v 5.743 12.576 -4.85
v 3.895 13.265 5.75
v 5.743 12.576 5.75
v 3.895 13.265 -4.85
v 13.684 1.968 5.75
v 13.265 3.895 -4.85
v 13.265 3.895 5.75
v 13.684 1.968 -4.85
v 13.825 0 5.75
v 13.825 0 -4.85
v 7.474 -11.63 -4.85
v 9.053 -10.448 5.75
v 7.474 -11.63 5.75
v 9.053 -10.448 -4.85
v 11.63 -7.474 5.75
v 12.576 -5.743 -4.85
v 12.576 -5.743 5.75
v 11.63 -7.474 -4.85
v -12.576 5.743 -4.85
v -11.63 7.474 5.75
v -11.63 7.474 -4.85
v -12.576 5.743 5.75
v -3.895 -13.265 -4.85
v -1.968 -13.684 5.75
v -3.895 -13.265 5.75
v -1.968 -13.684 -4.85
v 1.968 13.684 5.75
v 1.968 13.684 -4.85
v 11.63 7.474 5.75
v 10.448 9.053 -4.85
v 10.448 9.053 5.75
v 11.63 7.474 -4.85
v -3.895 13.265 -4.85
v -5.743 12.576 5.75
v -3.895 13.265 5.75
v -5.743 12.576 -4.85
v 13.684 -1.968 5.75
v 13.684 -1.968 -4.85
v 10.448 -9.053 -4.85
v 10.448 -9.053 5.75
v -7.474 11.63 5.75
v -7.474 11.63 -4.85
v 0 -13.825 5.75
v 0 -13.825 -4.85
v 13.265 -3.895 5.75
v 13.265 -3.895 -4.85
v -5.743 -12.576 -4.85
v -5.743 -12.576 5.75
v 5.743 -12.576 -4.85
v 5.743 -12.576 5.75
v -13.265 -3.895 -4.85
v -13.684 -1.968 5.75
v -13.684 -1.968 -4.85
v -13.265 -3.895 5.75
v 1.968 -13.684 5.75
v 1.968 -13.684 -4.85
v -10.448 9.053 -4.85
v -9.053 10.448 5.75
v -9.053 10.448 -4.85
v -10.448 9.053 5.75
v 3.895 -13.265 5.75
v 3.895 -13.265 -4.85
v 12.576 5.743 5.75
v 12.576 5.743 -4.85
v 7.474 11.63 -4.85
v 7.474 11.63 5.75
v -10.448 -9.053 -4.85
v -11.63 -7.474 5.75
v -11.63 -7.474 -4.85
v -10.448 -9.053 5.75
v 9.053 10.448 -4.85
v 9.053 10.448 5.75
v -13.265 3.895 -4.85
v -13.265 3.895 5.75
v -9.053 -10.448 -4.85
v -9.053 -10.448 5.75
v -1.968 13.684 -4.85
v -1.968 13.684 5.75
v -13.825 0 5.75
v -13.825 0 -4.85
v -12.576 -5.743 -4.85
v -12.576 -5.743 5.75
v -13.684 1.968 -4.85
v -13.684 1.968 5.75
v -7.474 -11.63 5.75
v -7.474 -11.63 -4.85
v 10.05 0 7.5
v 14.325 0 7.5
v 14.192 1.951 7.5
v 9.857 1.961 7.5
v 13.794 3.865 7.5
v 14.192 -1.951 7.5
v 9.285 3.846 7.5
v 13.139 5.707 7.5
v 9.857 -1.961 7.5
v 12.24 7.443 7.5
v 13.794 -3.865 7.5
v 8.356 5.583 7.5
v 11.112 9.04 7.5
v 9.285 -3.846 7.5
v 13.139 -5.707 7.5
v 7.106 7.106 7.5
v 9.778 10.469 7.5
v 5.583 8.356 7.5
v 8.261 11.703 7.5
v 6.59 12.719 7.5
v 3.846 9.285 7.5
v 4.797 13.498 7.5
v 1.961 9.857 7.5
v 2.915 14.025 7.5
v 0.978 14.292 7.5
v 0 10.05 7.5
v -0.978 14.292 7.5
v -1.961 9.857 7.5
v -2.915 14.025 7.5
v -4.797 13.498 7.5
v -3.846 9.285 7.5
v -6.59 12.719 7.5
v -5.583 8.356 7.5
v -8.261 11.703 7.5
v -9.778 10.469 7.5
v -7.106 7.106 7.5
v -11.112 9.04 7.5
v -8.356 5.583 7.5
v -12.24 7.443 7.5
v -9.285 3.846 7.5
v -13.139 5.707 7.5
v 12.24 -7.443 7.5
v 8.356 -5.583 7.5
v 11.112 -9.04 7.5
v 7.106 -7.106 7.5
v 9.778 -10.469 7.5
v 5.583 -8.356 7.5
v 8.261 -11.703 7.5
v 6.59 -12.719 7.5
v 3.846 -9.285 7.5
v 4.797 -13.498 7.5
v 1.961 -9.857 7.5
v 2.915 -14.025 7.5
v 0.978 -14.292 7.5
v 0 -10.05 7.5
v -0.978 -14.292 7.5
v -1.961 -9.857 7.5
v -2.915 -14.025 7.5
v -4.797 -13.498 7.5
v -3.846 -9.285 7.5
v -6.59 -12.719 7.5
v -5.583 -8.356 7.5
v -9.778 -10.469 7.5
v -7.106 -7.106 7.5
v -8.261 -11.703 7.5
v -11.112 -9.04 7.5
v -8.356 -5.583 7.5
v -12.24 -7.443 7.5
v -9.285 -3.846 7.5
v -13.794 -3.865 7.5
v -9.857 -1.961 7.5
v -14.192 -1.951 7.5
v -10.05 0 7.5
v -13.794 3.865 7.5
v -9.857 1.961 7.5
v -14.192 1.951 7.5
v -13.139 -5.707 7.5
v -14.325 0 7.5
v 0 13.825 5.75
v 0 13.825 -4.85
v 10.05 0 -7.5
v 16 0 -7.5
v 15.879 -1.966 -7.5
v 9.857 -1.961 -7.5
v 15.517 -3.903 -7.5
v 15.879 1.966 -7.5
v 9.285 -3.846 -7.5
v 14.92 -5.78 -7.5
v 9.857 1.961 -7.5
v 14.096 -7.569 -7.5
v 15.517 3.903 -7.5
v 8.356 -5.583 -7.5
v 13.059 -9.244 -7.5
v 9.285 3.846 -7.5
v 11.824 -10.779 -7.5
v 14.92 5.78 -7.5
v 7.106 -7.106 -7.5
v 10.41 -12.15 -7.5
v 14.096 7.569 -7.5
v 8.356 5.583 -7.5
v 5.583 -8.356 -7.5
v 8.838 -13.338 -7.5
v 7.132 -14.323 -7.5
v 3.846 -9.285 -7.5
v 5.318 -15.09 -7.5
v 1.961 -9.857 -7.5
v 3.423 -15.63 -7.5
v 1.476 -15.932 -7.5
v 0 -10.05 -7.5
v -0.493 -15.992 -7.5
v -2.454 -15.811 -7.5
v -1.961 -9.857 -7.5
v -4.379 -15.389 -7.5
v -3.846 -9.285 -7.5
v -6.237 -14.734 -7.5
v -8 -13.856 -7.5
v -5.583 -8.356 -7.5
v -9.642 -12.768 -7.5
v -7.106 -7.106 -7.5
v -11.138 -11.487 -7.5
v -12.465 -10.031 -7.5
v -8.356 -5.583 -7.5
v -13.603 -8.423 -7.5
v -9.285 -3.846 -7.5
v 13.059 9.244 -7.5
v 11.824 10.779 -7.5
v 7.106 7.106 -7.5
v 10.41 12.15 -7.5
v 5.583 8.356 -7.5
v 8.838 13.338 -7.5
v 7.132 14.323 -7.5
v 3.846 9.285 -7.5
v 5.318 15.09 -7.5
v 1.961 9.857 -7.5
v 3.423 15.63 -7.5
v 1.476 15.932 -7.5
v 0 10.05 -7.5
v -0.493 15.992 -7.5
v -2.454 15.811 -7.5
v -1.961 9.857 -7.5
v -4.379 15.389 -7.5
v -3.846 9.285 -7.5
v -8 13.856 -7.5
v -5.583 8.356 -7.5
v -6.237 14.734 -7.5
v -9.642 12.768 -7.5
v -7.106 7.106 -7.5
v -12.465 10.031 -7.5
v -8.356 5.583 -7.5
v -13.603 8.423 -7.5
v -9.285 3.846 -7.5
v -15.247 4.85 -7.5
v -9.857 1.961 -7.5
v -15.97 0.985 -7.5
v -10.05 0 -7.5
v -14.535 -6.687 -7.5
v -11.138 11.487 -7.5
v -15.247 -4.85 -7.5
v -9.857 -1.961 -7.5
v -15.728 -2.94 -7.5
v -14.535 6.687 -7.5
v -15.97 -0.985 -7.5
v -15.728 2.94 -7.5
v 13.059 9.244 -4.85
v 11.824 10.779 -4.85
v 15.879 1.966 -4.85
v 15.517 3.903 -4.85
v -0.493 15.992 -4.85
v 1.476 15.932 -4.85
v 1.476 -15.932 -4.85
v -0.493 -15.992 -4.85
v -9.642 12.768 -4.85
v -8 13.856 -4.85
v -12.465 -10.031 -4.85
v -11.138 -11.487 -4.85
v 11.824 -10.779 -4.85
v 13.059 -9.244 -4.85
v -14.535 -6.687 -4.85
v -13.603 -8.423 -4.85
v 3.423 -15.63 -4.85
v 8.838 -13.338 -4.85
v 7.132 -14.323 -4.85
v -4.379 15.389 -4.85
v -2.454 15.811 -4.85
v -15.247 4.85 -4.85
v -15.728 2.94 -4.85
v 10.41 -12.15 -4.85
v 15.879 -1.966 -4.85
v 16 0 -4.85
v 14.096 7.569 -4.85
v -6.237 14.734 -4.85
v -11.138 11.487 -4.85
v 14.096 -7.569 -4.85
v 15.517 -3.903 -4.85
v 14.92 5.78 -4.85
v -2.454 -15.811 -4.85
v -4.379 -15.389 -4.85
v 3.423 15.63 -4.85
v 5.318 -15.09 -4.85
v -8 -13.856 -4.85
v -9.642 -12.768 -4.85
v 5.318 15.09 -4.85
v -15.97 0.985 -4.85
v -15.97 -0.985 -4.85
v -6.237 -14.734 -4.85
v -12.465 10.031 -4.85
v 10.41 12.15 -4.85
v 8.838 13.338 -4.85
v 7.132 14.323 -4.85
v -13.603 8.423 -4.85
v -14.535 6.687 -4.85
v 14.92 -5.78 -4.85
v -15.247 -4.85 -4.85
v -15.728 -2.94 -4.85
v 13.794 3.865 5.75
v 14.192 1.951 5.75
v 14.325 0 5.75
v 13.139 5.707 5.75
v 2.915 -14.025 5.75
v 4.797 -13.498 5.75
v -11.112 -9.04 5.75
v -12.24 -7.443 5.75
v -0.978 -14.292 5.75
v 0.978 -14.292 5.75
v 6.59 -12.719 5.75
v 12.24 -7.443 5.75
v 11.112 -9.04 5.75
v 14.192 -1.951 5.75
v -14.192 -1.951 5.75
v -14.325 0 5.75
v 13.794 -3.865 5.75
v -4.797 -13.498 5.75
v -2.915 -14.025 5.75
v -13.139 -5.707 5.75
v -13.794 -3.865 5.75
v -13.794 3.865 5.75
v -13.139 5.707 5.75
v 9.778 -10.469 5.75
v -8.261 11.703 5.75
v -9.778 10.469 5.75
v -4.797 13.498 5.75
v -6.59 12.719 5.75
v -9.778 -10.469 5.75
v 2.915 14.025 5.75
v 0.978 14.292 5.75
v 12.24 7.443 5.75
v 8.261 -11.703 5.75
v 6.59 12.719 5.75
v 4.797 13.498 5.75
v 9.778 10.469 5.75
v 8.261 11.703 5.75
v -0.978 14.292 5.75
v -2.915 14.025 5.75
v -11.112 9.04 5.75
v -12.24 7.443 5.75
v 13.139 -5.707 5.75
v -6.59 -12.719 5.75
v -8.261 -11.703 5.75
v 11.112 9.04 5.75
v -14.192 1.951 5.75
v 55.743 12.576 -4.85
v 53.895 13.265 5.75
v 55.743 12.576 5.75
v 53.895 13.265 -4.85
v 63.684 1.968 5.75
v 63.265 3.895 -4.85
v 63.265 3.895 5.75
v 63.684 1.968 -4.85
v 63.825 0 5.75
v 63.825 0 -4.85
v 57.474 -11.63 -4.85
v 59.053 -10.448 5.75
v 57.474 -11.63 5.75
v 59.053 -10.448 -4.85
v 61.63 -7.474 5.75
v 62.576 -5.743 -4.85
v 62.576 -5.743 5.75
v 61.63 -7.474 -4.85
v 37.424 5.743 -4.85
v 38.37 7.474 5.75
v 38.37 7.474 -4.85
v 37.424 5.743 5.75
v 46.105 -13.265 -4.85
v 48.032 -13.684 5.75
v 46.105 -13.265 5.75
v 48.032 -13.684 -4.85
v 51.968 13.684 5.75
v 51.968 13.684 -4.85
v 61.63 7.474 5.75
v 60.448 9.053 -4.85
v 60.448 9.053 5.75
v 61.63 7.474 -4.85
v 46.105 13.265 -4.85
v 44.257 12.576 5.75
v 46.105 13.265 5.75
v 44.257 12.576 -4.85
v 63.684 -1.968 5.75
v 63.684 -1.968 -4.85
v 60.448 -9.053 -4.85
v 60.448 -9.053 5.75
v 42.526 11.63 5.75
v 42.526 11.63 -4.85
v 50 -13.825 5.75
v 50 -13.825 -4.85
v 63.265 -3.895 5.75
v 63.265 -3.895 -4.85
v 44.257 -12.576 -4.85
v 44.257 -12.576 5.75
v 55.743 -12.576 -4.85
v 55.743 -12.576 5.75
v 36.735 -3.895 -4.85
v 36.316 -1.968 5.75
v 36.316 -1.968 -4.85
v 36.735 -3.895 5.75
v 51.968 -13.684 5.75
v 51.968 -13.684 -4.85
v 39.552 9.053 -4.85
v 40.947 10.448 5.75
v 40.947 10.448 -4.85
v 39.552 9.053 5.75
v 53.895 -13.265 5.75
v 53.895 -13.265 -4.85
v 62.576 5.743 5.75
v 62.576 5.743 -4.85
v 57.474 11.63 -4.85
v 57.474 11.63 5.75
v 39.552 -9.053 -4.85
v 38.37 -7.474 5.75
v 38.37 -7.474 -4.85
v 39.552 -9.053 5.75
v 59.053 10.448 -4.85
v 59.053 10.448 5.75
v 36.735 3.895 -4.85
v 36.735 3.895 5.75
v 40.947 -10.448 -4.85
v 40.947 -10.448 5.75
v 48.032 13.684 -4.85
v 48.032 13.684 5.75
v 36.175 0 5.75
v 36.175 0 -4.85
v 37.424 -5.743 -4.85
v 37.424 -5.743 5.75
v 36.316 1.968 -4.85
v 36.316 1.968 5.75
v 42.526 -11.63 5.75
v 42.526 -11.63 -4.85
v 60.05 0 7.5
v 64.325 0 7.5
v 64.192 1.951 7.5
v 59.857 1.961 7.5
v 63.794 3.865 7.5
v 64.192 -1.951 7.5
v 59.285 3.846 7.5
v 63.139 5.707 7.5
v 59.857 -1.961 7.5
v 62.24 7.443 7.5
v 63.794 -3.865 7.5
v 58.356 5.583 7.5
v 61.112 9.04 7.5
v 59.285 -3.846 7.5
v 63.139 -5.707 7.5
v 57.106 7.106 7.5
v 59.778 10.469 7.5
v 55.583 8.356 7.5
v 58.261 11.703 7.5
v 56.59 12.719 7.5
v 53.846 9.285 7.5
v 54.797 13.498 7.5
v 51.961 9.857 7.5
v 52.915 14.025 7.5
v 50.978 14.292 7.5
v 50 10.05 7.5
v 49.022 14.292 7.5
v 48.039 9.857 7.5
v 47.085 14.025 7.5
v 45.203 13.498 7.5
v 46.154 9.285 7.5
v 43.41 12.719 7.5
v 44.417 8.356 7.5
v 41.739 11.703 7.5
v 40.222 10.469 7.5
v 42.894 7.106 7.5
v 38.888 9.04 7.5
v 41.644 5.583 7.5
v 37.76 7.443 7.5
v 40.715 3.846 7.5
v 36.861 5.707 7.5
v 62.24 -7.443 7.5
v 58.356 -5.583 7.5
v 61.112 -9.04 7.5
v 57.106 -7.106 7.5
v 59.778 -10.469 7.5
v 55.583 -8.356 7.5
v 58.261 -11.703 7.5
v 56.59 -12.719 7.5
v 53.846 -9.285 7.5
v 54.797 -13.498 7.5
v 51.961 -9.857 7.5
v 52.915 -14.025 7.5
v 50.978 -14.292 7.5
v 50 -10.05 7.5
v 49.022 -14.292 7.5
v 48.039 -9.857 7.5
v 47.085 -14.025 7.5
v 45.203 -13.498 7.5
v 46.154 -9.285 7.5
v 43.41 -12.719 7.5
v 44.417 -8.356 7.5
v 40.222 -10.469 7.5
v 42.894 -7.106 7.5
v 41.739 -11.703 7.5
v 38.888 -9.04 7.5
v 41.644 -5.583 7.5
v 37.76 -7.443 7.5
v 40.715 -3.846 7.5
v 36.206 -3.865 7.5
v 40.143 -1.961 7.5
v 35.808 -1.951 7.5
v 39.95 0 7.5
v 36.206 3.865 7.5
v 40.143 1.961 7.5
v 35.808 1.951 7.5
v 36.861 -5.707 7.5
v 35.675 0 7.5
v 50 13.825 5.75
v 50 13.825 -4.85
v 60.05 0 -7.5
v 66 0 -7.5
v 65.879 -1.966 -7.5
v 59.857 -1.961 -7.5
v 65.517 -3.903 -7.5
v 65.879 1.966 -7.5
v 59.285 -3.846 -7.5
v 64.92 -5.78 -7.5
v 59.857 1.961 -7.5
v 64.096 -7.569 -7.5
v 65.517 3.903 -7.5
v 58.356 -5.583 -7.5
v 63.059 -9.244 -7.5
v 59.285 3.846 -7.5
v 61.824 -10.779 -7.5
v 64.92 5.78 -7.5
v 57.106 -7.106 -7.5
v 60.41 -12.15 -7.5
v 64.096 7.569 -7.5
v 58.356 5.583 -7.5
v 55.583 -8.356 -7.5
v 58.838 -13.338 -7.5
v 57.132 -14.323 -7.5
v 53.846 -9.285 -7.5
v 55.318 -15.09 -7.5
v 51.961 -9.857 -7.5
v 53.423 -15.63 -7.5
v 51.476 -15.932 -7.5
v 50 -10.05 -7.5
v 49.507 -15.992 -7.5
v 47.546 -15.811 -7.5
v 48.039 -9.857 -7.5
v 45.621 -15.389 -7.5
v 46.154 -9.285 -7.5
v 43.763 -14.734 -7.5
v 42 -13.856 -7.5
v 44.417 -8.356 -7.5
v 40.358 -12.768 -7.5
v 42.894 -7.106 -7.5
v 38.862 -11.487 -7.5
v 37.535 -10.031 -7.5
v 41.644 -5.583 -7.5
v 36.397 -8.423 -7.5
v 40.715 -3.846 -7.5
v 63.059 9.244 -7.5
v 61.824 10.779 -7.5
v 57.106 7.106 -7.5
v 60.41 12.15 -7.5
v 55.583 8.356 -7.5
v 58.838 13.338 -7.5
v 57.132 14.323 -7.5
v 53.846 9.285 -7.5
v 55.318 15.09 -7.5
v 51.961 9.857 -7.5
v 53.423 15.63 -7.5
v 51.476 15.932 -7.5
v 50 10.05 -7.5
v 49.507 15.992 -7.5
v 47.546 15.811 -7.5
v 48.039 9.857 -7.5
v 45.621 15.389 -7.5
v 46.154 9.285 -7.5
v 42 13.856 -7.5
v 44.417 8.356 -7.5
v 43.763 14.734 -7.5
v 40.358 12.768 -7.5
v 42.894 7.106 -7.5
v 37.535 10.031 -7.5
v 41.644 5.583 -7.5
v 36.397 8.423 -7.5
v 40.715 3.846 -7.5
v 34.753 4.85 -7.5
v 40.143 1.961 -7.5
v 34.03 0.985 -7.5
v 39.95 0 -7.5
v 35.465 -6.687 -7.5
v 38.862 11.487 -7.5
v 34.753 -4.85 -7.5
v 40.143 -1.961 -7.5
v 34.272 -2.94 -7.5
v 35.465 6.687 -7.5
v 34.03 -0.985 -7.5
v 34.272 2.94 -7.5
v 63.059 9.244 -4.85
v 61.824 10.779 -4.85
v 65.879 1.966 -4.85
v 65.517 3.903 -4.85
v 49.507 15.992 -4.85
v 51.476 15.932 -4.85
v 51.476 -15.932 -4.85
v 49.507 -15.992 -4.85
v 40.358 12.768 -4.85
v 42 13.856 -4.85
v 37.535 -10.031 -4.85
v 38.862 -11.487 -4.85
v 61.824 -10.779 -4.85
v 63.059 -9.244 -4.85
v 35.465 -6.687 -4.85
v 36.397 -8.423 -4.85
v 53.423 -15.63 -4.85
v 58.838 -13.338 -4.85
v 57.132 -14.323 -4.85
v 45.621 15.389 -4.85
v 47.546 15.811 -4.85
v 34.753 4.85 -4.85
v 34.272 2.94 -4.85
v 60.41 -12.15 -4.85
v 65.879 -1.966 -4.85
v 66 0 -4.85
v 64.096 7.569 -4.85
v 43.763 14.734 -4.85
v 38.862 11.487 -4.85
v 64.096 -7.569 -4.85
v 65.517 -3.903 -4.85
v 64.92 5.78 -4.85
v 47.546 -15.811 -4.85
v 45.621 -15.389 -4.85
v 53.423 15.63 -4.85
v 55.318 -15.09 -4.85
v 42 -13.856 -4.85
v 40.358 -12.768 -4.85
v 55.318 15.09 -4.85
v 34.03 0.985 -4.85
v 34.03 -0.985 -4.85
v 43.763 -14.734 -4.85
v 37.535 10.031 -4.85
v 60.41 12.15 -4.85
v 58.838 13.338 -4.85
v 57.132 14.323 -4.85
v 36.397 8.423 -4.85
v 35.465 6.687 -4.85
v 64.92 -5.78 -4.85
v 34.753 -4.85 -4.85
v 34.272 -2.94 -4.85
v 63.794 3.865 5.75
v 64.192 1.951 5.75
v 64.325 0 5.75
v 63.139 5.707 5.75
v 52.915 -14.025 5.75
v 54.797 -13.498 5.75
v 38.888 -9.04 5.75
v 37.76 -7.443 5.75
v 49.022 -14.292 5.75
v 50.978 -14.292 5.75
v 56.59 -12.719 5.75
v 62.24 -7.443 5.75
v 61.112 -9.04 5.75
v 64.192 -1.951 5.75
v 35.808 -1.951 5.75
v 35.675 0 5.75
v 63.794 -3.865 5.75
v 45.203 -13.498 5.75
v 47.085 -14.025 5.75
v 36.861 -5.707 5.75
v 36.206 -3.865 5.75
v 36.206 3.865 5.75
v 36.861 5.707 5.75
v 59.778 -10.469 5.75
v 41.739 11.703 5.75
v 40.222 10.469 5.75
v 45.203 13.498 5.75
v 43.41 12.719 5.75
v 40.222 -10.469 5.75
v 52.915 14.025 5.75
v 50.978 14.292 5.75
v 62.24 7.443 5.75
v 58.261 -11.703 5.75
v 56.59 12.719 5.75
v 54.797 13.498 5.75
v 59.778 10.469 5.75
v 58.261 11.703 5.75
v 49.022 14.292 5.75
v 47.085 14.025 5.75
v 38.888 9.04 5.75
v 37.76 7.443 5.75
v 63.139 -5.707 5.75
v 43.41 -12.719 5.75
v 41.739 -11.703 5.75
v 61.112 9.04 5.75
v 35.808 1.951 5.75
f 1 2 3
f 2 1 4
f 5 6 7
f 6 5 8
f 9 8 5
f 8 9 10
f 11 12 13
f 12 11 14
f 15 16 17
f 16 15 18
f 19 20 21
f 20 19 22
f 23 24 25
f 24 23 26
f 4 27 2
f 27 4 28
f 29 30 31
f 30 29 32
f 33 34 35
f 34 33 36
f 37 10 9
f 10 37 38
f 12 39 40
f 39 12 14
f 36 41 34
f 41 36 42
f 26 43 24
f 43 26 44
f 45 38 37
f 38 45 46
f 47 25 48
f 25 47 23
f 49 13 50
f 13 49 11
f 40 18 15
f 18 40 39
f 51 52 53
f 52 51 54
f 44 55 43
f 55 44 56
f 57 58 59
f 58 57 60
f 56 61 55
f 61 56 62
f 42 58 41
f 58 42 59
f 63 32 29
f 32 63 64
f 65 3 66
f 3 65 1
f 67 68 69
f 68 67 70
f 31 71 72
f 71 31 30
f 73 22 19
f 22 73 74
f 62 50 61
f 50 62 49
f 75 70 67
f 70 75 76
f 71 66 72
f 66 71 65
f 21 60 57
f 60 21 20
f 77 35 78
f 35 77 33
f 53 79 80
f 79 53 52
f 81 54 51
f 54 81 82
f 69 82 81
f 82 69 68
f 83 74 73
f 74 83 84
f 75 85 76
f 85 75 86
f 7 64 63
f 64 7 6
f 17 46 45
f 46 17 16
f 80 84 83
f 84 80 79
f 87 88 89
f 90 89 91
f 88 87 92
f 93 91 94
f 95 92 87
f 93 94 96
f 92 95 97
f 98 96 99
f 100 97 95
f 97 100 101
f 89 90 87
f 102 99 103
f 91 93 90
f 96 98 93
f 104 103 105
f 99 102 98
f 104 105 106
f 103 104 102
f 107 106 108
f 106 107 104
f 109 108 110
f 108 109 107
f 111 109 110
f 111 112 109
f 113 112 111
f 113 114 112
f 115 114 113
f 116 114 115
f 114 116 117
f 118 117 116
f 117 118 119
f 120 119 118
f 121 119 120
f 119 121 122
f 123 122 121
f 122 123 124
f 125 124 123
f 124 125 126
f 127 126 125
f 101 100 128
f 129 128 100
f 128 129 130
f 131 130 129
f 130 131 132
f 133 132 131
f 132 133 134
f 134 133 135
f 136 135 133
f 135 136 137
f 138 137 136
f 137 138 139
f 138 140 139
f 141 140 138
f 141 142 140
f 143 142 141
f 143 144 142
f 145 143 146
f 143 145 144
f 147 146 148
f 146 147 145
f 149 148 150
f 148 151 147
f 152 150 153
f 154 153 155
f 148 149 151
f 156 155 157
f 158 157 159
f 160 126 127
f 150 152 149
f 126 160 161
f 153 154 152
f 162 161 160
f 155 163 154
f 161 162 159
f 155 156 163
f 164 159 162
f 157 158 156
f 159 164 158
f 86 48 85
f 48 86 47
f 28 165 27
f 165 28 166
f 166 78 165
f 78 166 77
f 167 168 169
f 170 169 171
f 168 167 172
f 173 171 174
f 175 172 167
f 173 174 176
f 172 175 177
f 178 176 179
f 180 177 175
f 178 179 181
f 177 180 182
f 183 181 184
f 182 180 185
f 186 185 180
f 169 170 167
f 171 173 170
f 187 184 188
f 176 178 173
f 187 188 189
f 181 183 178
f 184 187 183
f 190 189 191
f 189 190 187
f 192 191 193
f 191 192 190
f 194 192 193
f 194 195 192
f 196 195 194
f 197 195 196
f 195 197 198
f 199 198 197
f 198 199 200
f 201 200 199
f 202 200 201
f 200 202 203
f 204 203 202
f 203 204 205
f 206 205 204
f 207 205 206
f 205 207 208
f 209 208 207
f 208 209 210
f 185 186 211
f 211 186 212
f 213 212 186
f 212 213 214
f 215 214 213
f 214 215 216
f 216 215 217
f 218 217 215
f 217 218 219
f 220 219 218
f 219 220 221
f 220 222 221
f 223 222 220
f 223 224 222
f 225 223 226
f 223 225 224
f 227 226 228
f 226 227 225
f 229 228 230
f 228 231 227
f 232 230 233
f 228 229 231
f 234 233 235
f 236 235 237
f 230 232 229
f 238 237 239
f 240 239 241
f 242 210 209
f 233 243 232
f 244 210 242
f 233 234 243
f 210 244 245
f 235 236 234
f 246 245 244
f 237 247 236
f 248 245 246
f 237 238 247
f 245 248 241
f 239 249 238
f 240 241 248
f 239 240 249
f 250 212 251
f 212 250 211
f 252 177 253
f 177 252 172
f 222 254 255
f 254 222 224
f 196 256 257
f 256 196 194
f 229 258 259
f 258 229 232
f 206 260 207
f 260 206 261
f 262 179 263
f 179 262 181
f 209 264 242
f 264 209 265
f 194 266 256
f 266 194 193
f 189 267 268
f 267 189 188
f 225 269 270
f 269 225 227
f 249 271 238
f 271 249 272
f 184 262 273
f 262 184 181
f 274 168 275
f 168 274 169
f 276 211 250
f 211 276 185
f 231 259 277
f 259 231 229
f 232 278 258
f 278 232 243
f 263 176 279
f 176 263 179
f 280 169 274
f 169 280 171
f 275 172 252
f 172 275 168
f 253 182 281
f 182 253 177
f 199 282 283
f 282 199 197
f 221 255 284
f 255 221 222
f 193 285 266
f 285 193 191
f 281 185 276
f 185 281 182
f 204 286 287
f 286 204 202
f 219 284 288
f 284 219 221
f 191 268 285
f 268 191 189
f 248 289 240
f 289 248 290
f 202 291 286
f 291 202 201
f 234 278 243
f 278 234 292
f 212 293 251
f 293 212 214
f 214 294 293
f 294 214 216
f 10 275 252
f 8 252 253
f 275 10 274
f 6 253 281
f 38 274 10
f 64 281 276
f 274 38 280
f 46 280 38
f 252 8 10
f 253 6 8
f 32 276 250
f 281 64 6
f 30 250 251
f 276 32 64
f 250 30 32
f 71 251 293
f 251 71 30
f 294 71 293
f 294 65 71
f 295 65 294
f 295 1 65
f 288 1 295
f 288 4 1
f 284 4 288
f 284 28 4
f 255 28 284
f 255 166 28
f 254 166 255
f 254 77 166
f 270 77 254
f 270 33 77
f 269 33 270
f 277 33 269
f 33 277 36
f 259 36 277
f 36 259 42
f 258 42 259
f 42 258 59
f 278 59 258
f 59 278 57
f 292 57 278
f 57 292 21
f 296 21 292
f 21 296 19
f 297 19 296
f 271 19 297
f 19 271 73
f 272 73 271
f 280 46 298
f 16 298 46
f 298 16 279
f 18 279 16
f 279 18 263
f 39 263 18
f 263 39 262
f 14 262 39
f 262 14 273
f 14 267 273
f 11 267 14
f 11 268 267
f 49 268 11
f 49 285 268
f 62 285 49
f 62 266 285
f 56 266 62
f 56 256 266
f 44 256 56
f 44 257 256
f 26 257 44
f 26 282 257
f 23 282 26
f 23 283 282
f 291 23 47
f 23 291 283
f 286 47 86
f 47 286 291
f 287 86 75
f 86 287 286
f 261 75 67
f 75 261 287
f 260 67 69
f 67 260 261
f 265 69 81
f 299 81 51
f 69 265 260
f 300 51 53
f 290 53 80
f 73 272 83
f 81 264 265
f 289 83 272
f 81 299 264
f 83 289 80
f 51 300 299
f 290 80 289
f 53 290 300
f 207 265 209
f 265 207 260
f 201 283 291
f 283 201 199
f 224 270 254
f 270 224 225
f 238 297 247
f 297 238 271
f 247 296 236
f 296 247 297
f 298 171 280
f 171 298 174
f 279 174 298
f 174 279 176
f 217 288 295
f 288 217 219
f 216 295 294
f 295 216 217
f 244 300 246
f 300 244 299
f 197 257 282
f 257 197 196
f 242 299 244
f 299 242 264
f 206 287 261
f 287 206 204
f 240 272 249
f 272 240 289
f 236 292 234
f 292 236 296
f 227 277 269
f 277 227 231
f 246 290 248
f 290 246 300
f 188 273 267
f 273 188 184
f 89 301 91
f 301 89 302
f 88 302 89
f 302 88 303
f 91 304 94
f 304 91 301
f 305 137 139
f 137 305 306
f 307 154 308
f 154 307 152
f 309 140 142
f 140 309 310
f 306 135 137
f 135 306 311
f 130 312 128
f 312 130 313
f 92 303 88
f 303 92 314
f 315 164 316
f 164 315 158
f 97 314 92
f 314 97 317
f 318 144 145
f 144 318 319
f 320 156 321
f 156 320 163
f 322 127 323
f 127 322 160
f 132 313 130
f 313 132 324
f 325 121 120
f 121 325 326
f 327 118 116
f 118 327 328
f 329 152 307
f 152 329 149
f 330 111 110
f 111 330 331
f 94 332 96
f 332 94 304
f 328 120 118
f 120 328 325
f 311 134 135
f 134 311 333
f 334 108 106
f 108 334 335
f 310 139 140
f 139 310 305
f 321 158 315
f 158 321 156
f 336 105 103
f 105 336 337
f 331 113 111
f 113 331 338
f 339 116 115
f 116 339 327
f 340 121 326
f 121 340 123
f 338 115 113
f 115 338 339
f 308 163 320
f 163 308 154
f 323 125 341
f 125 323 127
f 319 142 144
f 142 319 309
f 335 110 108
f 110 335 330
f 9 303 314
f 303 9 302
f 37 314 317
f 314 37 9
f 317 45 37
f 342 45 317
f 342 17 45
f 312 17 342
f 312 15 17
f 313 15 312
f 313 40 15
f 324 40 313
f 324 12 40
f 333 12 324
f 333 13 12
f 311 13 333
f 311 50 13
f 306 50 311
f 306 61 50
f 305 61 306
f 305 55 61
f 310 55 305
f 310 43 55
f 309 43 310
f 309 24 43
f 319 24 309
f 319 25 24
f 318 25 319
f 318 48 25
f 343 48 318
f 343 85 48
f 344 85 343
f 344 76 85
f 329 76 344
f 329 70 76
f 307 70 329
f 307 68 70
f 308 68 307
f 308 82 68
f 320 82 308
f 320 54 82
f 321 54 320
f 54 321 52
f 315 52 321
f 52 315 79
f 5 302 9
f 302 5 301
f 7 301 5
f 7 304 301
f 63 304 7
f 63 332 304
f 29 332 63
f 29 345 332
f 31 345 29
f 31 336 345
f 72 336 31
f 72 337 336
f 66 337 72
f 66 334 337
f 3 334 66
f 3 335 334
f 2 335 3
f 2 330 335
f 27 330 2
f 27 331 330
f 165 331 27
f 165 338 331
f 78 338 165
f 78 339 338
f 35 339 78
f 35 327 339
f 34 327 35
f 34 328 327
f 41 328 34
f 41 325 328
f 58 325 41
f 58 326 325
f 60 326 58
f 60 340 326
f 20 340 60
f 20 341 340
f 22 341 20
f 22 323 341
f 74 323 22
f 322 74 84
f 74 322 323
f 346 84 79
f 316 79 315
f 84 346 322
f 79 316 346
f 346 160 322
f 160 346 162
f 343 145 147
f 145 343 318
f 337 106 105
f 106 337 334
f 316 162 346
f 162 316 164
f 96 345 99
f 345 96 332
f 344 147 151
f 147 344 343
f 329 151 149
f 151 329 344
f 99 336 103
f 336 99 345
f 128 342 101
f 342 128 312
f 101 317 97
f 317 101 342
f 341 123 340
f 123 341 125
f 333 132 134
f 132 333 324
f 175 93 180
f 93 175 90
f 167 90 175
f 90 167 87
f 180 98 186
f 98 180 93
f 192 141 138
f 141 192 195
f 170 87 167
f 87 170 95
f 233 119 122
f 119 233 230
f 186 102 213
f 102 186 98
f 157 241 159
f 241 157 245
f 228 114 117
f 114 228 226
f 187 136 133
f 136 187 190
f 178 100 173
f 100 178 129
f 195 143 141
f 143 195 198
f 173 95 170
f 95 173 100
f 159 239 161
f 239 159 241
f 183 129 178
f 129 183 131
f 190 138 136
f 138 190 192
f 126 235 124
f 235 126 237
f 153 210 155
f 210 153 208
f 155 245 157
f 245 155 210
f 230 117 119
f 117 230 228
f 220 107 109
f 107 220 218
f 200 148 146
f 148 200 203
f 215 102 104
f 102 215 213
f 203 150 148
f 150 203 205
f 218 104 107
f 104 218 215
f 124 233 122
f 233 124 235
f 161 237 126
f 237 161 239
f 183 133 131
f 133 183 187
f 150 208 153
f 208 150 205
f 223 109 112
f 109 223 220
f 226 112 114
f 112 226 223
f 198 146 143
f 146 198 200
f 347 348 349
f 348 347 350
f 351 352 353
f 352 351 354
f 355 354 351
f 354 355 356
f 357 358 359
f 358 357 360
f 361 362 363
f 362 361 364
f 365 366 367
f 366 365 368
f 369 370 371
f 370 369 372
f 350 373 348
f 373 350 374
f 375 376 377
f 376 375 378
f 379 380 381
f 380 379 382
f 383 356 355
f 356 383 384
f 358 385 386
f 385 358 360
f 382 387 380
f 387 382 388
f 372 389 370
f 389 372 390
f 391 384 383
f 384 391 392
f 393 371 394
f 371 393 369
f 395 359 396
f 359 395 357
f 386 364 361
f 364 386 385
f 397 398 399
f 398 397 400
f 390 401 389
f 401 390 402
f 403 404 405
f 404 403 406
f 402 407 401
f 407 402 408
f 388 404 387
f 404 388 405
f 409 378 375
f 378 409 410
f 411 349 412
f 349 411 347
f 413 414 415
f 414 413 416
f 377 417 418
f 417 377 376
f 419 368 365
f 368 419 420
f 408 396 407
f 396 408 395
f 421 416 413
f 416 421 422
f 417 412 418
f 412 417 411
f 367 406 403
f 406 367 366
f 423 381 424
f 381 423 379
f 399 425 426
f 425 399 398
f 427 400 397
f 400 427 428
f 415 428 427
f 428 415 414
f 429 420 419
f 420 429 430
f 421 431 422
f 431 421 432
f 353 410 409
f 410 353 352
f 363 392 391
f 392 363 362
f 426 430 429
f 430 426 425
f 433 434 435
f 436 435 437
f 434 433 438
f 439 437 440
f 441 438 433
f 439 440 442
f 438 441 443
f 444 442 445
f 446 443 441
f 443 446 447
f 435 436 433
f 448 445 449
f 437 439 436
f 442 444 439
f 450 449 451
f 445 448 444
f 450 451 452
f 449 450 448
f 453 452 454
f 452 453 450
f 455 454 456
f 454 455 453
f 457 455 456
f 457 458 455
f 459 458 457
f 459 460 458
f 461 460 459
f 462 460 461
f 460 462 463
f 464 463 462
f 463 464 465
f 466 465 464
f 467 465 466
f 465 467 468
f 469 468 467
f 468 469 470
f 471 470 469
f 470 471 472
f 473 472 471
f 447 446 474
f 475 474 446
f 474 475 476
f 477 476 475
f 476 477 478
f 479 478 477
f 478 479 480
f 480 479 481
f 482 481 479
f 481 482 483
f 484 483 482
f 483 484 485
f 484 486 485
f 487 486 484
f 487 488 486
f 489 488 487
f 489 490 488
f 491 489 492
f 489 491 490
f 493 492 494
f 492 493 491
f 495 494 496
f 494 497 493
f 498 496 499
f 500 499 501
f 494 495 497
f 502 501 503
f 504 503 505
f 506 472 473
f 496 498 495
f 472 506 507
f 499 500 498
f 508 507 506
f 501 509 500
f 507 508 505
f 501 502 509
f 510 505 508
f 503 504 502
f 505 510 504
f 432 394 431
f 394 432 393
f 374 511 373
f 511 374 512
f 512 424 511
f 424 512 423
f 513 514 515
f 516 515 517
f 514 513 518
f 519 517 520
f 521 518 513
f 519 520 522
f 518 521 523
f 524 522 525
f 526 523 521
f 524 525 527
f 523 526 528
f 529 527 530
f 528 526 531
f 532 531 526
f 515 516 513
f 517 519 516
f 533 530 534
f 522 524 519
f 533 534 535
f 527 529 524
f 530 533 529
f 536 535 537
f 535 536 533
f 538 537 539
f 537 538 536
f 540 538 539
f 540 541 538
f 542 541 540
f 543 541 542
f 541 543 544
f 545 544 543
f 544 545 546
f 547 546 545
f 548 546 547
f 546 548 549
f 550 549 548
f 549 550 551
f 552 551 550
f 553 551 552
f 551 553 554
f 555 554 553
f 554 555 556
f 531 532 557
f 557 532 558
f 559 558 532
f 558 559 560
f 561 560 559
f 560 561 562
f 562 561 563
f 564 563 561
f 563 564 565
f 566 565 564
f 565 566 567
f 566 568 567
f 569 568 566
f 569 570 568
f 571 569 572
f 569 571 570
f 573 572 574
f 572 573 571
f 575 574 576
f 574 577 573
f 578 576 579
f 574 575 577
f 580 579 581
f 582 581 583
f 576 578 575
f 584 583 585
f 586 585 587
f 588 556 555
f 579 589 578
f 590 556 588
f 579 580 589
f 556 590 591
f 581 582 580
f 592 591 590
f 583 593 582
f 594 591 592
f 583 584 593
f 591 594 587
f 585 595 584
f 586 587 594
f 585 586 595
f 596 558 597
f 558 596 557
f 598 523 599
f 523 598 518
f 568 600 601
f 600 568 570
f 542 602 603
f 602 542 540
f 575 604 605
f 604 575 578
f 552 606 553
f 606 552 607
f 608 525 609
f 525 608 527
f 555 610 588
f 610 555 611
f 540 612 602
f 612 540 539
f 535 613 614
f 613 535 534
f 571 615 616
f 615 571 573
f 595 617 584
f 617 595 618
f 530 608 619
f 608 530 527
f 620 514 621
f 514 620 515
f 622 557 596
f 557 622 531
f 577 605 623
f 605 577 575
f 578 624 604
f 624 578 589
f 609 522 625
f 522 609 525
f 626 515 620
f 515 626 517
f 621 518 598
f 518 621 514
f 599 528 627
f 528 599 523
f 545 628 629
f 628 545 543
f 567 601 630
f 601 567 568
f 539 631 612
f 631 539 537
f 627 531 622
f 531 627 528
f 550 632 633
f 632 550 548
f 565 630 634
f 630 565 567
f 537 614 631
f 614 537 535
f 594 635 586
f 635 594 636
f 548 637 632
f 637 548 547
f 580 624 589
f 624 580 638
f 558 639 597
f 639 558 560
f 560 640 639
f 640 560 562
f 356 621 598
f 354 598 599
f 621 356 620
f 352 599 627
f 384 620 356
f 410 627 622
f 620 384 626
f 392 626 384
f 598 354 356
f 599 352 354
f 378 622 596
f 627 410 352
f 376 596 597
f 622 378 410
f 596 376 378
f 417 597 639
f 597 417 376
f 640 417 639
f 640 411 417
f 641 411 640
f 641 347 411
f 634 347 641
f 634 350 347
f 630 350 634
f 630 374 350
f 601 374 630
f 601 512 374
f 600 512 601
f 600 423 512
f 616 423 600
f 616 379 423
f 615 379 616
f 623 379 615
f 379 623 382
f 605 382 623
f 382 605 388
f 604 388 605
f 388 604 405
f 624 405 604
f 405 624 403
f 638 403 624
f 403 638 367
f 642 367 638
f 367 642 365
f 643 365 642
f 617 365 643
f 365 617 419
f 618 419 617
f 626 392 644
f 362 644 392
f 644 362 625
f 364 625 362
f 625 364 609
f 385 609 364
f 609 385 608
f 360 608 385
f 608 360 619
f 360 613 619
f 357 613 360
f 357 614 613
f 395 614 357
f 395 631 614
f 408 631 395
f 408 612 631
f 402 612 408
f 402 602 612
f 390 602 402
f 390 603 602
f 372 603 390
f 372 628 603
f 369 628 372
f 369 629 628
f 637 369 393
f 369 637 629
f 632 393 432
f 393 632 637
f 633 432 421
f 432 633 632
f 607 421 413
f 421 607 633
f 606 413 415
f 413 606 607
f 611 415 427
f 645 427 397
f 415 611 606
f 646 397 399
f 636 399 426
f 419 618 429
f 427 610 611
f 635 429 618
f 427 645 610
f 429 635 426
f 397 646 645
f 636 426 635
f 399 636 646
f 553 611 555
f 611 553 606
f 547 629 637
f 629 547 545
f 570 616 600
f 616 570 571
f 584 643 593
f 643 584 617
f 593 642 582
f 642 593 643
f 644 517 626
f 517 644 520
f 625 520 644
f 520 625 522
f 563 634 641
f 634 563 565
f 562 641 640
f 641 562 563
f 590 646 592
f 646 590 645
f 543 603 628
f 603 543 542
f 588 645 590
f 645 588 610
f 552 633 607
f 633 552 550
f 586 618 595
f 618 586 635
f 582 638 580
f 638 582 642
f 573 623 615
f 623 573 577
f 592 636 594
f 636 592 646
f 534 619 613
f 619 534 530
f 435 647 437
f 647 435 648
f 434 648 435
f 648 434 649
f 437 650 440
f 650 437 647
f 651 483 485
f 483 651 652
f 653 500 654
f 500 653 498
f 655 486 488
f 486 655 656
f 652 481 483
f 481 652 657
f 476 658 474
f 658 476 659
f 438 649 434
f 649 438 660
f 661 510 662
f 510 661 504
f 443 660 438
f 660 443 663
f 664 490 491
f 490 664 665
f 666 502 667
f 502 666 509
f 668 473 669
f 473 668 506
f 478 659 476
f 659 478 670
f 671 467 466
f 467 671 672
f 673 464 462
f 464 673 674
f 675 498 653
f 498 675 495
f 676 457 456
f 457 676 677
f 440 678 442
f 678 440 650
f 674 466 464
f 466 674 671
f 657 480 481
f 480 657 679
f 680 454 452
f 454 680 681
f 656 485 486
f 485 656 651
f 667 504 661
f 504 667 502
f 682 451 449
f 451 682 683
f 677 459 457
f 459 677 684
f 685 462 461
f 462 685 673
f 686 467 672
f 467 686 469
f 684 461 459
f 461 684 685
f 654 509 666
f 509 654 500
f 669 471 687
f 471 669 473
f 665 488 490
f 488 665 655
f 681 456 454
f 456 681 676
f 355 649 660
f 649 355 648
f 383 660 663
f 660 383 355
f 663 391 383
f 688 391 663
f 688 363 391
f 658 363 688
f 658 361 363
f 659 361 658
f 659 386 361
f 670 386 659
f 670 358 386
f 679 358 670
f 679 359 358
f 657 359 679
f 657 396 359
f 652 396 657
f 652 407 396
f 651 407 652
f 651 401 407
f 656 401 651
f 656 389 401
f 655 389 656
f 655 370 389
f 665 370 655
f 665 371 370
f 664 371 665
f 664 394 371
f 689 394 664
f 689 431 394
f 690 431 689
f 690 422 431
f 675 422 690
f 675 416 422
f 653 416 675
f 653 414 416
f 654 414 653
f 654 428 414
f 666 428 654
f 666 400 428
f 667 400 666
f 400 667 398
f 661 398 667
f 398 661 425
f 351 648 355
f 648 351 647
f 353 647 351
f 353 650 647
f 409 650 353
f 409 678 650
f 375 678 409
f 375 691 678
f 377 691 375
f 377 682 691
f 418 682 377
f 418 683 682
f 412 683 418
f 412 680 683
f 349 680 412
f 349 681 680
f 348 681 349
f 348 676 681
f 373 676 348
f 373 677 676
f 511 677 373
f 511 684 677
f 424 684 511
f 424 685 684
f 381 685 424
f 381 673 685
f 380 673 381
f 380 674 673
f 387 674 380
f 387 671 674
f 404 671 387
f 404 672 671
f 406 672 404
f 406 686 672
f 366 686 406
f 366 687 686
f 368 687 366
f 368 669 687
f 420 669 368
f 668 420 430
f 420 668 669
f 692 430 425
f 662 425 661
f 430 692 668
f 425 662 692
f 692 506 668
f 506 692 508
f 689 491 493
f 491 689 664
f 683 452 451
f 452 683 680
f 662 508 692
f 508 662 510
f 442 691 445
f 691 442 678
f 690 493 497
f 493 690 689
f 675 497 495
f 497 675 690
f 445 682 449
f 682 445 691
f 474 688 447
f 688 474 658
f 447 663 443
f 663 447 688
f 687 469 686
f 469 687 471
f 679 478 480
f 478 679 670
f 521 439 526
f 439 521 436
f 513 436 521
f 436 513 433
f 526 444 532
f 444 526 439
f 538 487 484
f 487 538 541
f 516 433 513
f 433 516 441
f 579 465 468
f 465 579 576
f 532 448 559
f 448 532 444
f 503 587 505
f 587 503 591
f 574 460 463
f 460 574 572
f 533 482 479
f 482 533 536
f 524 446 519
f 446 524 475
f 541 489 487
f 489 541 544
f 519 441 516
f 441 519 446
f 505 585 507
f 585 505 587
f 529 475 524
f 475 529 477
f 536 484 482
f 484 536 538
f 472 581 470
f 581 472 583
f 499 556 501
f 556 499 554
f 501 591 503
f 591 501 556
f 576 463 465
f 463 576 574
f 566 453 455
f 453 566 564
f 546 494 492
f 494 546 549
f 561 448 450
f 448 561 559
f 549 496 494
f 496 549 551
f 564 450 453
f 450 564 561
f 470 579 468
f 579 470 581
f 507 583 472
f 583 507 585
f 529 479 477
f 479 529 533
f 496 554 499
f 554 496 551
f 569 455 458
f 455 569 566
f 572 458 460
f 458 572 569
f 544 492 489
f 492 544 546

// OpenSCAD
/**
 * @file frontWheelSpacers.scad
 *
 * @version 1.0
 *
 * @author Calum Judd Anderson
 *
 * @brief Aprilia RS 125 2006-2011 front wheel fitted to 2005 Yamaha 250WRF Forks
 */
$fa = 0.01;

INTERFERENCE_FIT = 0.001;
SLIDE_FIT = 0.05;

SPINDLE_RADIUS = 10;

CAPTIVE_LIP_HEIGHT = 1.75;
CAPTIVE_LIP_RADIUS_ADD = 0.5;

FRONT_SPACER_HEIGHT = 15;
FRONT_SPACER_OUT_RADIUS = 13.825;
FRONT_CAPTIVE_LIP_RADIUS = FRONT_SPACER_OUT_RADIUS + CAPTIVE_LIP_RADIUS_ADD;
FRONT_FORK_FACE_RADIUS = 16;
FRONT_FORK_FACE_HEIGHT = 2.65;

/**
 * @brief Front Left Spacer (Disc/Caliper Side)
 */
module leftFrontSpacer() {
    difference() {
        union() {
            cylinder(FRONT_SPACER_HEIGHT, FRONT_SPACER_OUT_RADIUS, FRONT_SPACER_OUT_RADIUS, center=true);
            translate([0, 0, (-(FRONT_SPACER_HEIGHT -FRONT_FORK_FACE_HEIGHT)/2)])
                cylinder(FRONT_FORK_FACE_HEIGHT, FRONT_FORK_FACE_RADIUS, FRONT_FORK_FACE_RADIUS, center=true);
            translate([0, 0, ((FRONT_SPACER_HEIGHT - CAPTIVE_LIP_HEIGHT)/2)])
                cylinder(CAPTIVE_LIP_HEIGHT, FRONT_CAPTIVE_LIP_RADIUS, FRONT_CAPTIVE_LIP_RADIUS, center=true);
        }
        cylinder(FRONT_SPACER_HEIGHT + INTERFERENCE_FIT, SPINDLE_RADIUS + SLIDE_FIT, SPINDLE_RADIUS + SLIDE_FIT, center=true);
    }
}

/**
 * @brief Front Right Spacer
 */
module rightFrontSpacer() {
    difference() {
        union() {
            cylinder(FRONT_SPACER_HEIGHT, FRONT_SPACER_OUT_RADIUS, FRONT_SPACER_OUT_RADIUS, center=true);
            translate([0, 0, (-(FRONT_SPACER_HEIGHT -FRONT_FORK_FACE_HEIGHT)/2)])
                cylinder(FRONT_FORK_FACE_HEIGHT, FRONT_FORK_FACE_RADIUS, FRONT_FORK_FACE_RADIUS, center=true);
            translate([0, 0, ((FRONT_SPACER_HEIGHT - CAPTIVE_LIP_HEIGHT)/2)])
                cylinder(CAPTIVE_LIP_HEIGHT, FRONT_CAPTIVE_LIP_RADIUS, FRONT_CAPTIVE_LIP_RADIUS, center=true);
        }
        cylinder(FRONT_SPACER_HEIGHT + INTERFERENCE_FIT, SPINDLE_RADIUS + SLIDE_FIT, SPINDLE_RADIUS + SLIDE_FIT, center=true);
    }
}

leftFrontSpacer();

translate([50, 0, 0])
    rightFrontSpacer();
